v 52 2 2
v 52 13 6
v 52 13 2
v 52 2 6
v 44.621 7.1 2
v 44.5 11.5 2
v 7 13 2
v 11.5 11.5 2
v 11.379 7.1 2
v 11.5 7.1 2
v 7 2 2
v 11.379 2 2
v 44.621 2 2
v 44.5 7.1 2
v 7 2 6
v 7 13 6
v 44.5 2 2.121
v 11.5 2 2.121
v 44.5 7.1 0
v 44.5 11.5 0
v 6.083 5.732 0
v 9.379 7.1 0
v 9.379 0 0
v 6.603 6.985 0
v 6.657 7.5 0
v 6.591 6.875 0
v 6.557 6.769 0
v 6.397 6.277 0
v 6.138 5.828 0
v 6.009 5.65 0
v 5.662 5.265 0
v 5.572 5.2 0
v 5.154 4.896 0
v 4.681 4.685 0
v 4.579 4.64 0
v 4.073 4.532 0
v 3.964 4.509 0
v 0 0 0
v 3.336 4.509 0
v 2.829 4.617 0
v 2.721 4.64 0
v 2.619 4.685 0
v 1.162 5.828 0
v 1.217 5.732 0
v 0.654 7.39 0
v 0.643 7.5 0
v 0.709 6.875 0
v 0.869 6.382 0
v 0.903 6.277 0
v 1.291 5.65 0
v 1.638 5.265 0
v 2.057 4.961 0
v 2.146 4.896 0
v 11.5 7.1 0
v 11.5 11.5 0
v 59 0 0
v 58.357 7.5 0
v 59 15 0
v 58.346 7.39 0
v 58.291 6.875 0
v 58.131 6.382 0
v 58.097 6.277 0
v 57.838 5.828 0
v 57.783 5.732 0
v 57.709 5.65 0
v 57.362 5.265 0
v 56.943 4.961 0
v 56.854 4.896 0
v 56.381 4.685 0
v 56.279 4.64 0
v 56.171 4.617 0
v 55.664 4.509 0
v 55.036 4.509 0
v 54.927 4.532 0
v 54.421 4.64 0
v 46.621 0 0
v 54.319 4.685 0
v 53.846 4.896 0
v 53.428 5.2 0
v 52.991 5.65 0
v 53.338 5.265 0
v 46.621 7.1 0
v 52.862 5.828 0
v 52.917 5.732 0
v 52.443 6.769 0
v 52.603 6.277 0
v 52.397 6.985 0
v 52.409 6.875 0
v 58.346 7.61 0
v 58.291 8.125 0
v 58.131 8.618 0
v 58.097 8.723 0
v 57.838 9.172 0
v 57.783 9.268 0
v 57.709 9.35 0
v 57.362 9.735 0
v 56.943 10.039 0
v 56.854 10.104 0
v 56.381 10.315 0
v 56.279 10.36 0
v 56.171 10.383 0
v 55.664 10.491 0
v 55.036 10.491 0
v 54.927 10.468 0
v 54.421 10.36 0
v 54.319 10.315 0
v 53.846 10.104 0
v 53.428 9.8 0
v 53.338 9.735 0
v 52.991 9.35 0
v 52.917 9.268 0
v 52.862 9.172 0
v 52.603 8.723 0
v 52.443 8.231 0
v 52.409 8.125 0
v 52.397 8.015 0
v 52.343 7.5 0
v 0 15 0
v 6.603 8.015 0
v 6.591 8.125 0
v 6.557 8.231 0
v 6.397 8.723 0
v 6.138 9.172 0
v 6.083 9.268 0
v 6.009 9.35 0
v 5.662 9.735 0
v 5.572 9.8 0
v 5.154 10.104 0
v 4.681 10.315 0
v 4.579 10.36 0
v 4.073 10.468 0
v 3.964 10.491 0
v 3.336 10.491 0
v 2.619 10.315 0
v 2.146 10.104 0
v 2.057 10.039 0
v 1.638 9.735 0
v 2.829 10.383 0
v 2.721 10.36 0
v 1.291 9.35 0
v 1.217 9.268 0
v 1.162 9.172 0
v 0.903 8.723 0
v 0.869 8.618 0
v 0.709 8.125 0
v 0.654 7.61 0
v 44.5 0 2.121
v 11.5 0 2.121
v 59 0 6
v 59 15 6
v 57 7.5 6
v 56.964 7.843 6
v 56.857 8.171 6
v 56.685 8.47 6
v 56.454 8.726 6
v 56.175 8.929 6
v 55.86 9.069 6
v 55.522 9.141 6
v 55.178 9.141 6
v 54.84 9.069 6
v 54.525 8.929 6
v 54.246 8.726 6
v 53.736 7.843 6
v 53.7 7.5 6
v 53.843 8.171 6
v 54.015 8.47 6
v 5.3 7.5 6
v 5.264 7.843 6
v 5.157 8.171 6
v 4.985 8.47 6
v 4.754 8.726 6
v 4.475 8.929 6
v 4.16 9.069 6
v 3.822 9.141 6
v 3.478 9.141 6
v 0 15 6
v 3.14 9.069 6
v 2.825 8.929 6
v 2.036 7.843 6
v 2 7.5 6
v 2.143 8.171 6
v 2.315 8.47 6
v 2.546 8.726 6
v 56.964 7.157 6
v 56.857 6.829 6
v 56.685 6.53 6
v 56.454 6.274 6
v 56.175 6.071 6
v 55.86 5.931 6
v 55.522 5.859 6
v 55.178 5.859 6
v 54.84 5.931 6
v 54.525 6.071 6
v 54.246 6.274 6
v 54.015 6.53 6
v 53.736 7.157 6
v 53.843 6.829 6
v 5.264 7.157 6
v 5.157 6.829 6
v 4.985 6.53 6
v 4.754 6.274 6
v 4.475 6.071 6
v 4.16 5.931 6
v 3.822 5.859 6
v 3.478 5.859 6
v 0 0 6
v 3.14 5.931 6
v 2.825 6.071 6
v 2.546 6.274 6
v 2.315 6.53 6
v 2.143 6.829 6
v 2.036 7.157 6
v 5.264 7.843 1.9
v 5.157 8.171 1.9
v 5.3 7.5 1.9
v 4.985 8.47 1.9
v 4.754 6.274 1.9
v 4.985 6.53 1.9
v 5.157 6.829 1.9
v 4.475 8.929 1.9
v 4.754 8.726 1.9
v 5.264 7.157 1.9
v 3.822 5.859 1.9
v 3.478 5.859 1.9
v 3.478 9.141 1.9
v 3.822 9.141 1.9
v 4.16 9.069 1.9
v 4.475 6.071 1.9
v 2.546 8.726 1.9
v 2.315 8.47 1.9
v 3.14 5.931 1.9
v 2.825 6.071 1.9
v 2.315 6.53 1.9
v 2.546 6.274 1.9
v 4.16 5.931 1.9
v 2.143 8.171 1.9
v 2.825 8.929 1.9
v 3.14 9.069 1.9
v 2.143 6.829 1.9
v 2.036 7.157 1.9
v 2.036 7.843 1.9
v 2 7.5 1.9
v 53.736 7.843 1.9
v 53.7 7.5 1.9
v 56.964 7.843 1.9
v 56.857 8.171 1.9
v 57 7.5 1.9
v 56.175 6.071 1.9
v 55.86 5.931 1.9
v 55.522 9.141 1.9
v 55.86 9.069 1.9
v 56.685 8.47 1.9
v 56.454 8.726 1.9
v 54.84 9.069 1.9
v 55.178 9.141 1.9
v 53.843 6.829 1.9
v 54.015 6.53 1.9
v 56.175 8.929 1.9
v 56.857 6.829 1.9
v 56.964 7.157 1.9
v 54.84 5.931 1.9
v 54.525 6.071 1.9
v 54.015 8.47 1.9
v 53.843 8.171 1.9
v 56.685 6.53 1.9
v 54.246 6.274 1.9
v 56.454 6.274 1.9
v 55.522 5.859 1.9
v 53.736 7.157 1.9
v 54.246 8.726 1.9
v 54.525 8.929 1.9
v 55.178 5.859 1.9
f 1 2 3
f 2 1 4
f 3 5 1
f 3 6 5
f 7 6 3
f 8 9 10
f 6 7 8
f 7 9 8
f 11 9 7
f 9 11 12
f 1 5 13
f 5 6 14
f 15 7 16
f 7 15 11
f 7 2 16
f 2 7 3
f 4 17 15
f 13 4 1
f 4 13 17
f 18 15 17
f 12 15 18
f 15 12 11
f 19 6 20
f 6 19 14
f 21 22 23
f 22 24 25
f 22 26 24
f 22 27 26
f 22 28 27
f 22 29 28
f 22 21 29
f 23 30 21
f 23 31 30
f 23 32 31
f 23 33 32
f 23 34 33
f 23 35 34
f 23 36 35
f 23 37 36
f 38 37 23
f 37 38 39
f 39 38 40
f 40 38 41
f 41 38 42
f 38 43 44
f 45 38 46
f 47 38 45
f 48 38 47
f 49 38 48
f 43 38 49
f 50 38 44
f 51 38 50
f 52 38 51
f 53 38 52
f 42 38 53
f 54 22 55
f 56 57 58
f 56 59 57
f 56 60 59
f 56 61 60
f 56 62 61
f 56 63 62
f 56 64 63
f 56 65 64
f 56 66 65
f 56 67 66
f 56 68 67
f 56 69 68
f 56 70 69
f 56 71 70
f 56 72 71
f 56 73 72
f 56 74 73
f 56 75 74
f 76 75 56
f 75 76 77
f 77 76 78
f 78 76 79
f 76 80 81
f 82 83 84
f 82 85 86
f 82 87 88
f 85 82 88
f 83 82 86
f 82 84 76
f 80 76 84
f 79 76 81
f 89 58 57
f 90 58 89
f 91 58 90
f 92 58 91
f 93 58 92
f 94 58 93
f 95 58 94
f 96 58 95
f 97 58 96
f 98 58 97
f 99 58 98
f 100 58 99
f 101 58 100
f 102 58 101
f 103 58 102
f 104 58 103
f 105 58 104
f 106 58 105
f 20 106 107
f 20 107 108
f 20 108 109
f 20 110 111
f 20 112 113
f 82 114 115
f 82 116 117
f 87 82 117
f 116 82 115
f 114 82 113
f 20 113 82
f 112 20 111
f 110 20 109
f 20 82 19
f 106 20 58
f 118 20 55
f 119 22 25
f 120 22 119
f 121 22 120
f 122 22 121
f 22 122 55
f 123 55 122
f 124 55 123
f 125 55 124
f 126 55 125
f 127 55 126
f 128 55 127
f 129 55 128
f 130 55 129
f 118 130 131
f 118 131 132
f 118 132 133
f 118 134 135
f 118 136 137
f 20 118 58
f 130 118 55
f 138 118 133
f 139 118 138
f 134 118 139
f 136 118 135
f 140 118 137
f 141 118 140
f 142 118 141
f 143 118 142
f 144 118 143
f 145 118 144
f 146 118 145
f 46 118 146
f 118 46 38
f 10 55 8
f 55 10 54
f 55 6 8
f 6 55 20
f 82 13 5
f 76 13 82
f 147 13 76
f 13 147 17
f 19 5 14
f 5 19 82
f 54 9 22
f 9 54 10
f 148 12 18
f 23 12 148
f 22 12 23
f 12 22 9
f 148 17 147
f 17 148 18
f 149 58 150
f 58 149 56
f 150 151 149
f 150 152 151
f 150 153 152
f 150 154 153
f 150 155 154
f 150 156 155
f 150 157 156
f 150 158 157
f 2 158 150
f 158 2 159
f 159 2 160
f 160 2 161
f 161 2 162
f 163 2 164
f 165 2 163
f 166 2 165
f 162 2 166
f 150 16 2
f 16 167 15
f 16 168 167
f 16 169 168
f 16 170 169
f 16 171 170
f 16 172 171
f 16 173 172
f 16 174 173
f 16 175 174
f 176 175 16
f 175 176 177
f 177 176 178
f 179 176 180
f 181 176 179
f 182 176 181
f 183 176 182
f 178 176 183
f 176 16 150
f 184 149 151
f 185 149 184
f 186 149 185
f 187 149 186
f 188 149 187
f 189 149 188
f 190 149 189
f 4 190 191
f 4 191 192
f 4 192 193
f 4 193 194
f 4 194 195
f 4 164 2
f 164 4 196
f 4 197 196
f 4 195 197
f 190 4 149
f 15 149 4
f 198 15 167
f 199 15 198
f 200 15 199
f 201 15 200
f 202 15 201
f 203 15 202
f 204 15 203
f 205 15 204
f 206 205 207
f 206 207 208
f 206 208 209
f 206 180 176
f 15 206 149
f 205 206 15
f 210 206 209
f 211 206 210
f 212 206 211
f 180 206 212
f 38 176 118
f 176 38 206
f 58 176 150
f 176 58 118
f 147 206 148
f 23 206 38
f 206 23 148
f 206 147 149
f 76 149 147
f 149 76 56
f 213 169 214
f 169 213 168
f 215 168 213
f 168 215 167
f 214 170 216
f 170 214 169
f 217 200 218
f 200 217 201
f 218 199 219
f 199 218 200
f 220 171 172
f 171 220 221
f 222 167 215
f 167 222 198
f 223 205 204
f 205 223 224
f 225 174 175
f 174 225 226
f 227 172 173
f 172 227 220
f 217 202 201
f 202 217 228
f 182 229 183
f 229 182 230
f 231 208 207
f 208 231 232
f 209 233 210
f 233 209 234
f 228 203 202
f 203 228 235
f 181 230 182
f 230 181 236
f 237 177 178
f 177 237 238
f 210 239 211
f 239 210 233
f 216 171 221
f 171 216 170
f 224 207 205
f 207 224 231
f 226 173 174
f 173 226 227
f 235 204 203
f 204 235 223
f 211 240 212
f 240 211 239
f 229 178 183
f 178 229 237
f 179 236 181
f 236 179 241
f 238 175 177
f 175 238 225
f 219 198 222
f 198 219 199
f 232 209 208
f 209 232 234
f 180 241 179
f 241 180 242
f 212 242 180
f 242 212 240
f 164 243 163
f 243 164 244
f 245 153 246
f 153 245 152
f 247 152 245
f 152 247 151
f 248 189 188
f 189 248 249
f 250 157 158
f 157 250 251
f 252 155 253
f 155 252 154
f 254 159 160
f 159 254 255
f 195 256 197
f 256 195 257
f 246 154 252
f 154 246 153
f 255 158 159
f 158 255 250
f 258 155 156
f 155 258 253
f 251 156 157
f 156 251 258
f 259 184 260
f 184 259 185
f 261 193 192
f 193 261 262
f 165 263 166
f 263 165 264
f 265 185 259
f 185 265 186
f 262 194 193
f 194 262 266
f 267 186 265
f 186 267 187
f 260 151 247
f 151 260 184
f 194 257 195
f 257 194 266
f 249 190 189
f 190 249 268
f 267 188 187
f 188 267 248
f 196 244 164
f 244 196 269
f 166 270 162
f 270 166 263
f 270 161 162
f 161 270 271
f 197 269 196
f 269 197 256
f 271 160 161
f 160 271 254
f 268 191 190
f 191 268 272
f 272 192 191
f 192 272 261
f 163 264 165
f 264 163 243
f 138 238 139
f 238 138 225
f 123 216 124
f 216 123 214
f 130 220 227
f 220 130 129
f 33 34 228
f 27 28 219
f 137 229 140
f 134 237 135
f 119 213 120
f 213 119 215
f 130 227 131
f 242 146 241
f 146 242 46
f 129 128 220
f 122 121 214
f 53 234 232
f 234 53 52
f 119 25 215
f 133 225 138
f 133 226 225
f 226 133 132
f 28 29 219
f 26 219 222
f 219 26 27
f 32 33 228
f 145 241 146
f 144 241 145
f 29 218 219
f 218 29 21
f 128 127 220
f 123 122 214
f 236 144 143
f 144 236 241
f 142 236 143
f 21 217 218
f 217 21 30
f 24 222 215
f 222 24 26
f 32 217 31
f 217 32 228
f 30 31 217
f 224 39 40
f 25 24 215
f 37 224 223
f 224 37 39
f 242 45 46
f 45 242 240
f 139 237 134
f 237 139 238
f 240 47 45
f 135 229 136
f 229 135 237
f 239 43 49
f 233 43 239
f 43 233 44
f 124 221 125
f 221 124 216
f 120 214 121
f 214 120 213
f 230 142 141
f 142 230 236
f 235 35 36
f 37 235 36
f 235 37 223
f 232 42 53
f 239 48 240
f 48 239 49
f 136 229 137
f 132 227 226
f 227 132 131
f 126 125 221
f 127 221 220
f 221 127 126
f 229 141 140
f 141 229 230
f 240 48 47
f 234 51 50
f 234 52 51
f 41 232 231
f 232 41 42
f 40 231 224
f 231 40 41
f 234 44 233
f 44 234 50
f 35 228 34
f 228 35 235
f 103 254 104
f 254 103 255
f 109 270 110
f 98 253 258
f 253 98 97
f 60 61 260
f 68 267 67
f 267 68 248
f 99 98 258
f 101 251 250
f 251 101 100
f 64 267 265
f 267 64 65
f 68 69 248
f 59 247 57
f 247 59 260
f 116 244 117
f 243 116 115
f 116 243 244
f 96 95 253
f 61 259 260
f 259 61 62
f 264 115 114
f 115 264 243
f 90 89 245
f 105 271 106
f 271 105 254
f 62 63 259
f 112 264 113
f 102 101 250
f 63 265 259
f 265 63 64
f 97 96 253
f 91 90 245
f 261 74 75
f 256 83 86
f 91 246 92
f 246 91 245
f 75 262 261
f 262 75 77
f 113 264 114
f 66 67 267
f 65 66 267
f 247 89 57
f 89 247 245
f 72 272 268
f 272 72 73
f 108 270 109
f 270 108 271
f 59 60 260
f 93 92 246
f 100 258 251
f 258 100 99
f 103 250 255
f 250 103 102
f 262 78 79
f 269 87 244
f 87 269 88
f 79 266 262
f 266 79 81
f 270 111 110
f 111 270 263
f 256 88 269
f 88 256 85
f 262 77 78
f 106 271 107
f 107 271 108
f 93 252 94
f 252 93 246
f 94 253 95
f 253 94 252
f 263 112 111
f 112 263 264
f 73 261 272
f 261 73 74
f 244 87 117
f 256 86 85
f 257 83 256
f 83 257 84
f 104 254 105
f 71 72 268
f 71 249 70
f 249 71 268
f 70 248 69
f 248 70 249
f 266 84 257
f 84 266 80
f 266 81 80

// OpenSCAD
module cone() {
    hull() {
        translate([0,0,1.9]) cylinder(d=3.3, h=1, $fn=30);
        cylinder(d=7.3, h=0.1, $fn=30);
    }
}



module clamp(width,height,connector_w,connector_h,connector_left_offset,connector_bottom_offset) {
    w = width+14;
    h = height+4;
    difference() {
        cube([w, h, 6]);
        translate([7,2,2]) {
            cube([width, height, 6]);
            translate([connector_left_offset,height-connector_bottom_offset-connector_h,-2]) cube([connector_w, connector_h, 6]);
            translate([connector_left_offset,(height-connector_bottom_offset-connector_h)/2-2,-2]) {
                hull() {
                    rotate([0,45,0]) cube([3,height-connector_bottom_offset, 3], center=true);
                    translate([connector_w,0,0]) rotate([0,45,0]) cube([3,height-connector_bottom_offset, 3], center=true);
                }
            }
        }
        
        
        
        translate([3.3/2+2, (h)/2,0]) cylinder(d=3.3, h=7,$fn=30);
        translate([w-(3.3/2+2), (h)/2,0]) cylinder(d=3.3, h=7,$fn=30);
        
        translate([3.3/2+2, (h)/2,-1]) cone();
        translate([w-(3.3/2+2), (h)/2,-1]) cone();
    }
    
}

//clamp(40, 13.2, 30, 4.8, 4.4, 2.8);
//clamp(46, 10.6, 36.5, 4.8, 4.5, 1.5);
clamp(45, 11, 33, 4.8, 4.5, 1.5);
